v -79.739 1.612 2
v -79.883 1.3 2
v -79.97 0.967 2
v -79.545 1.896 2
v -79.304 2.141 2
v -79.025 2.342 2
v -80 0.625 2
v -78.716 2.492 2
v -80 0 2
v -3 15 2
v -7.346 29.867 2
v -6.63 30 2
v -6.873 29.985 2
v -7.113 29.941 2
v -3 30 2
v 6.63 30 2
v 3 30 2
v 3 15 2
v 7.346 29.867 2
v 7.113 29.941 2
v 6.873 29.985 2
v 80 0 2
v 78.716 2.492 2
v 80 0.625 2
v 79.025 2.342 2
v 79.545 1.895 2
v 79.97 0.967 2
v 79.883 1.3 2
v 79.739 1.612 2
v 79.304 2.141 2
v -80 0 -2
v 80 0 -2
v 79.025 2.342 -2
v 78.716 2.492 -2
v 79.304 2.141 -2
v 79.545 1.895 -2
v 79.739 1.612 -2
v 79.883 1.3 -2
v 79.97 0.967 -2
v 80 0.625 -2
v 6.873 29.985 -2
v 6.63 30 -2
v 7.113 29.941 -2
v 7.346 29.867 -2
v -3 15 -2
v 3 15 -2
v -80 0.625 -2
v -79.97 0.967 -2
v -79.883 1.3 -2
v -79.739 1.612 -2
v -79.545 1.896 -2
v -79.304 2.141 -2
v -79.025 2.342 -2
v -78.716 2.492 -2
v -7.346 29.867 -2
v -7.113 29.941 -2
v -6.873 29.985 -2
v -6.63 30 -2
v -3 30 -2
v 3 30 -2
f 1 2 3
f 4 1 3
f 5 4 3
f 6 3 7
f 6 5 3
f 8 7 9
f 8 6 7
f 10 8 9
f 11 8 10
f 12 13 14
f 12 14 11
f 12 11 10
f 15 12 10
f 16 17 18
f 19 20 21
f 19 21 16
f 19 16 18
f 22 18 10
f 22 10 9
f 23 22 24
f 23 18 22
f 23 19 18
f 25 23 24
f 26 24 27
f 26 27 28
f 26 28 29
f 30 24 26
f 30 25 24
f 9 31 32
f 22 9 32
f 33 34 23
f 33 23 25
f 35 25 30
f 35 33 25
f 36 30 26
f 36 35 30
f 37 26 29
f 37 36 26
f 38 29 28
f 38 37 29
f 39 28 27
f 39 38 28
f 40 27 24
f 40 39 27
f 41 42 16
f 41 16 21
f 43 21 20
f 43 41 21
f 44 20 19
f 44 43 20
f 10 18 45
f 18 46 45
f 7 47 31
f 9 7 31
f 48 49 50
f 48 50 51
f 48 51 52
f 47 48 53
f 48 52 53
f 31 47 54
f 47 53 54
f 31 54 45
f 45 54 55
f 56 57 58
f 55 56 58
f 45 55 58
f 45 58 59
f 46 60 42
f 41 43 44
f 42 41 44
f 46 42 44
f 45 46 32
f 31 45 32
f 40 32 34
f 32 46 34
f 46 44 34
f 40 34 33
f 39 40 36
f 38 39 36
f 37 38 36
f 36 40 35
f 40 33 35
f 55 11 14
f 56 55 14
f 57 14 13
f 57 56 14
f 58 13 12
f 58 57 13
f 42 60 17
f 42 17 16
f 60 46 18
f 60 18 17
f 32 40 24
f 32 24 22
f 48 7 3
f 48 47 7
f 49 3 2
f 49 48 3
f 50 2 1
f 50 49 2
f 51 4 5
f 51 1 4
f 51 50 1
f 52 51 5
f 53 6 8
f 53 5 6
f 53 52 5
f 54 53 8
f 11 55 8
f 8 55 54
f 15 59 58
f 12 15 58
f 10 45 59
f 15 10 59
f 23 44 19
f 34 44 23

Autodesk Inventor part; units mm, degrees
ref_plane "YZ Plane" through (0, 0, 0) normal (1, 0, 0) x (0, 1, 0)
ref_plane "XZ Plane" through (0, 0, 0) normal (0, 1, 0) x (-1, 0, 0)
ref_plane "XY Plane" through (0, 0, 0) normal (0, 0, 1) x (1, 0, 0)
sketch "Náčrt1" plane through (0, 0, 0) normal (0, 0, 1) x (1, 0, 0)
  line L0 (0, 15) -> (-3, 15)
  line L1 (-3, 15) -> (-3, 30)
  line L2 (-3, 30) -> (-6.6296, 30)
  line L3 (-7.3458, 29.8673) -> (-78.7162, 2.4924)
  line L4 (-80, 0.625) -> (-80, 0)
  line L5 (-80, 0) -> (0, 0)
  arc A0 (-78.7162, 2.4924) -> (-80, 0.625) centre (-78, 0.625) ccw
  arc A1 (-6.6296, 30) -> (-7.3458, 29.8673) centre (-6.6296, 28) ccw
  line L6 (0, 15) -> (0, 0)
  line L7 (0, 15) -> (3, 15)
  line L8 (3, 15) -> (3, 30)
  line L9 (3, 30) -> (6.6296, 30)
  line L10 (7.3458, 29.8673) -> (78.7162, 2.4924)
  line L11 (80, 0.625) -> (80, 0)
  line L12 (80, 0) -> (0, 0)
  arc A2 (80, 0.625) -> (78.7162, 2.4924) centre (78, 0.625) ccw
  arc A3 (7.3458, 29.8673) -> (6.6296, 30) centre (6.6296, 28) ccw
  point P0 (-7, 30)
  point P1 (-80, 2)
  point P2 (7, 30)
  point P3 (80, 2)
  dimension "d1" = 15
  dimension "d5" = 4
  dimension "d7" = 2
  dimension "d9" = 2
  dimension "d12" = 15
  dimension "d13" = 3
  dimension "d14" = 80
extrude "Vysunutí1" add sketch "Náčrt1" along normal mid plane 4
equation "\"d10\" = d4"
equation "\"d4\" = 4"
properties part number "LegLessMaterial"
